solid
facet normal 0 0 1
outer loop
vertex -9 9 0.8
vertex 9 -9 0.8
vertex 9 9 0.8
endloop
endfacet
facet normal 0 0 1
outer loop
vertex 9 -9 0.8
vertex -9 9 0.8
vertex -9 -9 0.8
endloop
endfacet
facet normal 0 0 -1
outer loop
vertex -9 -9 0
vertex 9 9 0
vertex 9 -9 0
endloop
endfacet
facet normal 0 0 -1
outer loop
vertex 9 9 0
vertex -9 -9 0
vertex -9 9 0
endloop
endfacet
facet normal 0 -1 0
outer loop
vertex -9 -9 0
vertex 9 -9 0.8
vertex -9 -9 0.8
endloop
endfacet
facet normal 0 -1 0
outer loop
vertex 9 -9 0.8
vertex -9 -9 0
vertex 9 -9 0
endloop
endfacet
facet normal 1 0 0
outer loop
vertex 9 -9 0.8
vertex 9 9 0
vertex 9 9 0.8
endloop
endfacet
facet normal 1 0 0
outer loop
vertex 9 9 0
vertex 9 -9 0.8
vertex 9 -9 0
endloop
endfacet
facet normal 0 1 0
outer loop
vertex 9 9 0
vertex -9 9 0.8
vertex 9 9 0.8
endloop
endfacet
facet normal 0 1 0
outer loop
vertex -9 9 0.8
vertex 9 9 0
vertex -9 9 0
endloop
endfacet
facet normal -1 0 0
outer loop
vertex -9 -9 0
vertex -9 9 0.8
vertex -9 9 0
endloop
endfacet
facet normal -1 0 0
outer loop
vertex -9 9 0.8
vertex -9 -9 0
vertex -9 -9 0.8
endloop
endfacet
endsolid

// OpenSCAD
$fn = 64;

pcb_x = 18.0;
pcb_y = 18.0;
pcb_th = 0.8;

color([0.05, 0.45, 0.18])
translate([-pcb_x/2, -pcb_y/2, 0])
cube([pcb_x, pcb_y, pcb_th], center=false);
